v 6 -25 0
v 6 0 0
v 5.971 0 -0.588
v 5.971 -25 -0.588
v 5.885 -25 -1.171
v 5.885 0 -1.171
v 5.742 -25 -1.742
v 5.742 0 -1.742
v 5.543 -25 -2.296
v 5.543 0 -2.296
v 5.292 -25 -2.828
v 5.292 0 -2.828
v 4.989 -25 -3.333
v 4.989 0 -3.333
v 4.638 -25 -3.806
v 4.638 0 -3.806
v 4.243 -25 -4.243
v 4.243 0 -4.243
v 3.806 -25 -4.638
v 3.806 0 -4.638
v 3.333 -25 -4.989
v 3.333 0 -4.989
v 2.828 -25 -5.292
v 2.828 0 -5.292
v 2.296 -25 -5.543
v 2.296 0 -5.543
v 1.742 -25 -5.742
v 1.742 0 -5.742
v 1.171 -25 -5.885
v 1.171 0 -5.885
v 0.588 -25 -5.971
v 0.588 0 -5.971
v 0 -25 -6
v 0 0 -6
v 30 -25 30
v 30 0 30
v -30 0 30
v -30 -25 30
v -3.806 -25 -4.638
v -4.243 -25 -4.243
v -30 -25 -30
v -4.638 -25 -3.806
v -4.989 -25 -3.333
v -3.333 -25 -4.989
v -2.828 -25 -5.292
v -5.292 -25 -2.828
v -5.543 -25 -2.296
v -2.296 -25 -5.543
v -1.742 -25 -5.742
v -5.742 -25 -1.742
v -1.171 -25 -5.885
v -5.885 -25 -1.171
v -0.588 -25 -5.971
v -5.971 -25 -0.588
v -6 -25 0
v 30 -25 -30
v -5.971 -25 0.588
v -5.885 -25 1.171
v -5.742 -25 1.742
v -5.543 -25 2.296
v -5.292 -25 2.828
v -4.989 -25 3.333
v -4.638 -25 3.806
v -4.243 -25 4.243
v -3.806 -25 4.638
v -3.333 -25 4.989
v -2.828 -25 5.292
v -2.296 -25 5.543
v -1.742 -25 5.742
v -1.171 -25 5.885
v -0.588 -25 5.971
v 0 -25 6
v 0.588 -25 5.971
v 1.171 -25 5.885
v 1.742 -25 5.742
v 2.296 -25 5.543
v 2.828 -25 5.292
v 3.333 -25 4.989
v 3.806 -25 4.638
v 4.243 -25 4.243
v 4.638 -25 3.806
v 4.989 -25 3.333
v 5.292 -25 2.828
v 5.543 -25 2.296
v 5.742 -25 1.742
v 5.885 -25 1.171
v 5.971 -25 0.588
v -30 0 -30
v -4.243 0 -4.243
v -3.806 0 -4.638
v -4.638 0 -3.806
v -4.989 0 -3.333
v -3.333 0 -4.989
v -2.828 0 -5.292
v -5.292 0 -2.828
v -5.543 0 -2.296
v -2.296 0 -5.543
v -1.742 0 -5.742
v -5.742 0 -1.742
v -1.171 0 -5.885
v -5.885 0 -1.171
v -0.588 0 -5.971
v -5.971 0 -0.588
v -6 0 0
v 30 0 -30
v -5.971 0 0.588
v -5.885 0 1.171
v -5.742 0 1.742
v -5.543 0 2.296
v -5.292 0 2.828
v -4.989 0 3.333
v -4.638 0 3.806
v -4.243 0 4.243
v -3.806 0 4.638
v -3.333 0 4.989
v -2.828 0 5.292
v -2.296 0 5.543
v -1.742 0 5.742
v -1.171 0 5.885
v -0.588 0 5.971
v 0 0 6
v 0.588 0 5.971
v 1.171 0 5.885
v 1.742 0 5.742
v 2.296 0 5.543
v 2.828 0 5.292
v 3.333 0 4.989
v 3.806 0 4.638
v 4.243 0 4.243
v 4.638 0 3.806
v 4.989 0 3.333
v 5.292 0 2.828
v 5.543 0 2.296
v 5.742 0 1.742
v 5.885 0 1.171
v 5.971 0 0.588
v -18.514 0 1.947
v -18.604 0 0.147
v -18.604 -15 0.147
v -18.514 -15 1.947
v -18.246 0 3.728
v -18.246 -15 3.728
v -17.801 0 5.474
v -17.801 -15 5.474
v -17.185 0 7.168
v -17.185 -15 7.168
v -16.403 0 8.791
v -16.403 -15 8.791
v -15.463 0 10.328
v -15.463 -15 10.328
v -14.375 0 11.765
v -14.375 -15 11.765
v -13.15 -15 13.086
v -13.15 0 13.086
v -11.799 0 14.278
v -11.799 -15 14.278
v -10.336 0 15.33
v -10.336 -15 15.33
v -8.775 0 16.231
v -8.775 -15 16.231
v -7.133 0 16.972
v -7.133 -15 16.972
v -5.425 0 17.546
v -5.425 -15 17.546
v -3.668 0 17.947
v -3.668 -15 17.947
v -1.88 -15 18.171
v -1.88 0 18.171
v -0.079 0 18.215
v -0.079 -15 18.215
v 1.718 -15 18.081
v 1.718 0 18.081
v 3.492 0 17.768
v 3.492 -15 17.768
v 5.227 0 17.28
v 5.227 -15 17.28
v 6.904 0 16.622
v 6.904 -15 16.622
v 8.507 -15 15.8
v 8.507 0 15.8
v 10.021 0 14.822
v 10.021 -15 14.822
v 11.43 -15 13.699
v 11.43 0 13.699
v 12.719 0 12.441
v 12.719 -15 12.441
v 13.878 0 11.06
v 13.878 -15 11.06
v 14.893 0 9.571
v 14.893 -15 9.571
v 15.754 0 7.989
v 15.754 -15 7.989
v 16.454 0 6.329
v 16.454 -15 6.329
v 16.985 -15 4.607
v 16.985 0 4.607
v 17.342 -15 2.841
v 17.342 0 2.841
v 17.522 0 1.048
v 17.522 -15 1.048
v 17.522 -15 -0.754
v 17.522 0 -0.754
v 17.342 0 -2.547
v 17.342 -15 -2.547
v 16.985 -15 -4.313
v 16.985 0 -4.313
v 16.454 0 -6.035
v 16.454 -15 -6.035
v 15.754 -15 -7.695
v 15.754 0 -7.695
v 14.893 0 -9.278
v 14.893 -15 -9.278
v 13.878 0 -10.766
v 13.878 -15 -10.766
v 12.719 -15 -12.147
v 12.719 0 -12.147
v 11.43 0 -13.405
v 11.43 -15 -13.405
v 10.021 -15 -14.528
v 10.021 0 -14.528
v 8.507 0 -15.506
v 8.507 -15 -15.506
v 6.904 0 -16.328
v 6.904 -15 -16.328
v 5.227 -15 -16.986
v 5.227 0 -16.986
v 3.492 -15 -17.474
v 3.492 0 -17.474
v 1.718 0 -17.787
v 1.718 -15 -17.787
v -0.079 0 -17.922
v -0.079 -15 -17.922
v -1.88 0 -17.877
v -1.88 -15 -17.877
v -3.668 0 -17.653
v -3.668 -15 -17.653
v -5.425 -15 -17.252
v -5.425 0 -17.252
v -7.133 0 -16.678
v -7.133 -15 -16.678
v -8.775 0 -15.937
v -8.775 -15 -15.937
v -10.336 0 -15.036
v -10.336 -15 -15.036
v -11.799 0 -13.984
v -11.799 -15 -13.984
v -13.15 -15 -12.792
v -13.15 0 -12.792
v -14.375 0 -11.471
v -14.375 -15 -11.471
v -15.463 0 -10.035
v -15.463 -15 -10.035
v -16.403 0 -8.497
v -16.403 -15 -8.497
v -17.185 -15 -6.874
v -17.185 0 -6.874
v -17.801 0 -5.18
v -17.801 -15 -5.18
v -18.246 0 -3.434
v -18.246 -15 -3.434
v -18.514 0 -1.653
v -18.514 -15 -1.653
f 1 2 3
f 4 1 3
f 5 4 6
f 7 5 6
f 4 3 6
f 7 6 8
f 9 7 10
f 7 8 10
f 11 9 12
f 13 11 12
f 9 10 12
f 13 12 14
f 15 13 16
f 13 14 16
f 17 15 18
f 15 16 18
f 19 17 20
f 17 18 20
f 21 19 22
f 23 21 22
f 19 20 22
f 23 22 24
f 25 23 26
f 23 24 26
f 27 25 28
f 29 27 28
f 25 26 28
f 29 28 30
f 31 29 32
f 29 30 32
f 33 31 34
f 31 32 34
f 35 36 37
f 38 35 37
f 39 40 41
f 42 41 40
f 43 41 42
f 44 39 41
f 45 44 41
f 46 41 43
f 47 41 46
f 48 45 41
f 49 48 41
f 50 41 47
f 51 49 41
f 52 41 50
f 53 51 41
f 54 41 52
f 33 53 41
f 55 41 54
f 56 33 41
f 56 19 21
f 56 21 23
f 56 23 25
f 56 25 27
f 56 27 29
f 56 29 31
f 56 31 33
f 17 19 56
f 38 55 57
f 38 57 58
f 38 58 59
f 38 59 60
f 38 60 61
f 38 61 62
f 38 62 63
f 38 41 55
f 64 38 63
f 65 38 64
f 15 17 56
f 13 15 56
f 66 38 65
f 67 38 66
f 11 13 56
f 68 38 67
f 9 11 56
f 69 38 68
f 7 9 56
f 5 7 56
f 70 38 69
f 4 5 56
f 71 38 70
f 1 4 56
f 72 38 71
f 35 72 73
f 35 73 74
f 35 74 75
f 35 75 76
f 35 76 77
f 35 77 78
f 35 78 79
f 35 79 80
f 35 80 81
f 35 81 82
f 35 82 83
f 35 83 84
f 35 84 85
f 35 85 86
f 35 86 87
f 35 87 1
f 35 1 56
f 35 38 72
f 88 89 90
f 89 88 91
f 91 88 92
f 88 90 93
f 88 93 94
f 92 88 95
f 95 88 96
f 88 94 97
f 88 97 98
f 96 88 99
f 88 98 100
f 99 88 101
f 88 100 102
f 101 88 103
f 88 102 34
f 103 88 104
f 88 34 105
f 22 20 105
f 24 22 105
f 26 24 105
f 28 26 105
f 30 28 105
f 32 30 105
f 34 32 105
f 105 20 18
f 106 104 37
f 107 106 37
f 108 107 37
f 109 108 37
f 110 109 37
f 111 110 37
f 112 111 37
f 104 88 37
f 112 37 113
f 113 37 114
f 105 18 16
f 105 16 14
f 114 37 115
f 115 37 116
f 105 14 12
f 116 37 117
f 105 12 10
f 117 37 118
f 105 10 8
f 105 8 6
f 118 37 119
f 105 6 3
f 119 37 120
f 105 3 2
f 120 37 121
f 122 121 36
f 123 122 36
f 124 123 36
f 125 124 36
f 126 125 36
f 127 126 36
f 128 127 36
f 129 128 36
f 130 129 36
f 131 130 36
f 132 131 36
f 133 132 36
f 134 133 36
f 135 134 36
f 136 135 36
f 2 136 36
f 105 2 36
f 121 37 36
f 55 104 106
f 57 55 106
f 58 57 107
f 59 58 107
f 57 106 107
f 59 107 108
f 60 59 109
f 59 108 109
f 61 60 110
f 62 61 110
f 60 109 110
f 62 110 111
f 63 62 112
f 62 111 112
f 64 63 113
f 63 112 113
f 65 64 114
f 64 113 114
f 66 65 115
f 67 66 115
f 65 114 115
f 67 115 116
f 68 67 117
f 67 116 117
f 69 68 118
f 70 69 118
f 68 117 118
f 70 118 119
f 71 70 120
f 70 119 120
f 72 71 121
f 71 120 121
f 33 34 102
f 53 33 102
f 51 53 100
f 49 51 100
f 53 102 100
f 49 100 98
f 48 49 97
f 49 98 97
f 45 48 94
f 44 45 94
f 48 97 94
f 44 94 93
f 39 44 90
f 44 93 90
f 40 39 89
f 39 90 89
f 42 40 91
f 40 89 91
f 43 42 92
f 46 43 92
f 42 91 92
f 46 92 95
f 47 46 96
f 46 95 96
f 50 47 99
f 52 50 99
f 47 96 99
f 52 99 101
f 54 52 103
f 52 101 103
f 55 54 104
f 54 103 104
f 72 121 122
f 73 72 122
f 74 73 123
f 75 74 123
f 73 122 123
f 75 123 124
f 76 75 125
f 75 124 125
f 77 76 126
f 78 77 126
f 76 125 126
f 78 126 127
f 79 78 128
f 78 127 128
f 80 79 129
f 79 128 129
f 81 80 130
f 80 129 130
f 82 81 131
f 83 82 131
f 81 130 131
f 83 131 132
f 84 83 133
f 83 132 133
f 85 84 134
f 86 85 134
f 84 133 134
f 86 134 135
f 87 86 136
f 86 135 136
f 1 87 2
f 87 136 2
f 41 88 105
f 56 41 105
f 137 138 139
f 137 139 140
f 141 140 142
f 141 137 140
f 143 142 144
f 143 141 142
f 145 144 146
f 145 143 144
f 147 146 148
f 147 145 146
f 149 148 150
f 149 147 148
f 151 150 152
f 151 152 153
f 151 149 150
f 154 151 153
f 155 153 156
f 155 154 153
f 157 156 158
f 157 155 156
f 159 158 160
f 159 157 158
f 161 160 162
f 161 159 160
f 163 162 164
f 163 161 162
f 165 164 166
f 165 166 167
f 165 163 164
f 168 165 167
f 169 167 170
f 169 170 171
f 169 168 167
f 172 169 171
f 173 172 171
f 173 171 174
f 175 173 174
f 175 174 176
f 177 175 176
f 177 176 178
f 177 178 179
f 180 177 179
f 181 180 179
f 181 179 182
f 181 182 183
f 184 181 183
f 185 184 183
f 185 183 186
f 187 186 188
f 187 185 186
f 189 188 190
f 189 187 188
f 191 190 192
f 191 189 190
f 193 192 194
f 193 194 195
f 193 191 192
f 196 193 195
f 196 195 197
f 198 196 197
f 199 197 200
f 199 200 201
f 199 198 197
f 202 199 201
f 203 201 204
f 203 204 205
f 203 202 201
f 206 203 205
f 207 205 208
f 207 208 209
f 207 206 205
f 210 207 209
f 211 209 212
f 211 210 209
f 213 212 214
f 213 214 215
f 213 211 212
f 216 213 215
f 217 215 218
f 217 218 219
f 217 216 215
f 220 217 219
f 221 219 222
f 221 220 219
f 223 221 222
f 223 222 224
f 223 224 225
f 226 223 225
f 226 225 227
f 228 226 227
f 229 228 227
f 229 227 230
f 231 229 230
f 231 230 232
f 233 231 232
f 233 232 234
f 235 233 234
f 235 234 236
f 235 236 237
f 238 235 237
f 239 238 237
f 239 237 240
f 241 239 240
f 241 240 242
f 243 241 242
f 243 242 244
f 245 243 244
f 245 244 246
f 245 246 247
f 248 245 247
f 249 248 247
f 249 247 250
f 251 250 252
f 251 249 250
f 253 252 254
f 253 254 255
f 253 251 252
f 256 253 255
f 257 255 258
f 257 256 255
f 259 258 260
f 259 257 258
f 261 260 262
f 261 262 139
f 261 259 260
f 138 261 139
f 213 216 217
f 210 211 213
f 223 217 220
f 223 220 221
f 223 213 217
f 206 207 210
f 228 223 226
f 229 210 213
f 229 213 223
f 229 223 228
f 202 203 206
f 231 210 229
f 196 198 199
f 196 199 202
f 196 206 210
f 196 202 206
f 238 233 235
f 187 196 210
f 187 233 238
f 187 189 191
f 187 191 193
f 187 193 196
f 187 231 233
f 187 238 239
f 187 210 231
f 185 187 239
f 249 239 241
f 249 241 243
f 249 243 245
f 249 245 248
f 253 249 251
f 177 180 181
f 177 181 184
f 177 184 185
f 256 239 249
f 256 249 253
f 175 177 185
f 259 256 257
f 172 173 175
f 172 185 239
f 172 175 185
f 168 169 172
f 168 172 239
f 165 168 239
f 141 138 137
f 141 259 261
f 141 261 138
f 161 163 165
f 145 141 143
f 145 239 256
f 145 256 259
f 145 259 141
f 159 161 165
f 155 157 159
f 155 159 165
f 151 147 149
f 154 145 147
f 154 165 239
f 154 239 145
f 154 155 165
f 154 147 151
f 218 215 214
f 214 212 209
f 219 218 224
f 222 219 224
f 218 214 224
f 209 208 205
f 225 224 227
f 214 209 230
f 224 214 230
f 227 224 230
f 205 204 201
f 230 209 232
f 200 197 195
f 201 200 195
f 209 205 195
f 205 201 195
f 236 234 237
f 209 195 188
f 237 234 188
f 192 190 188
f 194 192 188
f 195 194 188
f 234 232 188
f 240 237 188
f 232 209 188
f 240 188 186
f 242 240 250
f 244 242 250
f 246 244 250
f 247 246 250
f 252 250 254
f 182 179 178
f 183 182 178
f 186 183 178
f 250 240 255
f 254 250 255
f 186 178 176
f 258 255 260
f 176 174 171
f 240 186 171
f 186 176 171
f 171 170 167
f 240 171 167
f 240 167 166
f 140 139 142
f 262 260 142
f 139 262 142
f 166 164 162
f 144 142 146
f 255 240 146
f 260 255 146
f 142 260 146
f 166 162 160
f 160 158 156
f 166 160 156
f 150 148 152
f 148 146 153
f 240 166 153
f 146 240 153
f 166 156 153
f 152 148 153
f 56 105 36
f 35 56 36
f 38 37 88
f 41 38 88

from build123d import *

# Parameters (mm, degrees)
F1_DEPTH = 25
F2_R     = 18.0741301682
F2_R_2   = 11.1620865302
F2_R_3   = 6
F3_DEPTH = 15


with BuildPart() as f1:
    # F0 (on Front) → F1 (new body)
    with BuildSketch(Plane.XZ):
        with BuildLine():
            ThreePointArc((-6, 0), (-4.2426406871, 4.2426406871), (0, 6))
            Line((0, 6), (0, 30))
            Line((0, 30), (-30, 30))
            Line((-30, 30), (-30, 0))
            Line((-30, 0), (-6, 0))
        make_face()
        with BuildLine():
            ThreePointArc((0, 6), (4.2426406871, 4.2426406871), (6, 0))
            Line((6, 0), (30, 0))
            Line((30, 0), (30, 30))
            Line((30, 30), (0, 30))
            Line((0, 30), (0, 6))
        make_face()
        with BuildLine():
            Line((30, 0), (6, 0))
            ThreePointArc((6, 0), (4.2426406871, -4.2426406871), (0, -6))
            Line((0, -6), (0, -30))
            Line((0, -30), (30, -30))
            Line((30, -30), (30, 0))
        make_face()
        with BuildLine():
            Line((0, -30), (0, -6))
            ThreePointArc((0, -6), (-4.2426406871, -4.2426406871), (-6, 0))
            Line((-6, 0), (-30, 0))
            Line((-30, 0), (-30, -30))
            Line((-30, -30), (0, -30))
        make_face()
    extrude(amount=F1_DEPTH)


with BuildPart() as f3:
    # F2 (on face) → F3 (new body)
    with BuildSketch(Plane(origin=(0, 0, 0), x_dir=(-1, 0, 0), z_dir=(0, 1, 0))):
        with Locations((0.5297824973, 0.1469794079)):
            Circle(F2_R)
        Circle(F2_R_2, mode=Mode.SUBTRACT)
        Circle(F2_R_2)
        Circle(F2_R_3, mode=Mode.SUBTRACT)
        Circle(F2_R_3)
    extrude(amount=-F3_DEPTH)


solid = Compound([f1.part, f3.part])
